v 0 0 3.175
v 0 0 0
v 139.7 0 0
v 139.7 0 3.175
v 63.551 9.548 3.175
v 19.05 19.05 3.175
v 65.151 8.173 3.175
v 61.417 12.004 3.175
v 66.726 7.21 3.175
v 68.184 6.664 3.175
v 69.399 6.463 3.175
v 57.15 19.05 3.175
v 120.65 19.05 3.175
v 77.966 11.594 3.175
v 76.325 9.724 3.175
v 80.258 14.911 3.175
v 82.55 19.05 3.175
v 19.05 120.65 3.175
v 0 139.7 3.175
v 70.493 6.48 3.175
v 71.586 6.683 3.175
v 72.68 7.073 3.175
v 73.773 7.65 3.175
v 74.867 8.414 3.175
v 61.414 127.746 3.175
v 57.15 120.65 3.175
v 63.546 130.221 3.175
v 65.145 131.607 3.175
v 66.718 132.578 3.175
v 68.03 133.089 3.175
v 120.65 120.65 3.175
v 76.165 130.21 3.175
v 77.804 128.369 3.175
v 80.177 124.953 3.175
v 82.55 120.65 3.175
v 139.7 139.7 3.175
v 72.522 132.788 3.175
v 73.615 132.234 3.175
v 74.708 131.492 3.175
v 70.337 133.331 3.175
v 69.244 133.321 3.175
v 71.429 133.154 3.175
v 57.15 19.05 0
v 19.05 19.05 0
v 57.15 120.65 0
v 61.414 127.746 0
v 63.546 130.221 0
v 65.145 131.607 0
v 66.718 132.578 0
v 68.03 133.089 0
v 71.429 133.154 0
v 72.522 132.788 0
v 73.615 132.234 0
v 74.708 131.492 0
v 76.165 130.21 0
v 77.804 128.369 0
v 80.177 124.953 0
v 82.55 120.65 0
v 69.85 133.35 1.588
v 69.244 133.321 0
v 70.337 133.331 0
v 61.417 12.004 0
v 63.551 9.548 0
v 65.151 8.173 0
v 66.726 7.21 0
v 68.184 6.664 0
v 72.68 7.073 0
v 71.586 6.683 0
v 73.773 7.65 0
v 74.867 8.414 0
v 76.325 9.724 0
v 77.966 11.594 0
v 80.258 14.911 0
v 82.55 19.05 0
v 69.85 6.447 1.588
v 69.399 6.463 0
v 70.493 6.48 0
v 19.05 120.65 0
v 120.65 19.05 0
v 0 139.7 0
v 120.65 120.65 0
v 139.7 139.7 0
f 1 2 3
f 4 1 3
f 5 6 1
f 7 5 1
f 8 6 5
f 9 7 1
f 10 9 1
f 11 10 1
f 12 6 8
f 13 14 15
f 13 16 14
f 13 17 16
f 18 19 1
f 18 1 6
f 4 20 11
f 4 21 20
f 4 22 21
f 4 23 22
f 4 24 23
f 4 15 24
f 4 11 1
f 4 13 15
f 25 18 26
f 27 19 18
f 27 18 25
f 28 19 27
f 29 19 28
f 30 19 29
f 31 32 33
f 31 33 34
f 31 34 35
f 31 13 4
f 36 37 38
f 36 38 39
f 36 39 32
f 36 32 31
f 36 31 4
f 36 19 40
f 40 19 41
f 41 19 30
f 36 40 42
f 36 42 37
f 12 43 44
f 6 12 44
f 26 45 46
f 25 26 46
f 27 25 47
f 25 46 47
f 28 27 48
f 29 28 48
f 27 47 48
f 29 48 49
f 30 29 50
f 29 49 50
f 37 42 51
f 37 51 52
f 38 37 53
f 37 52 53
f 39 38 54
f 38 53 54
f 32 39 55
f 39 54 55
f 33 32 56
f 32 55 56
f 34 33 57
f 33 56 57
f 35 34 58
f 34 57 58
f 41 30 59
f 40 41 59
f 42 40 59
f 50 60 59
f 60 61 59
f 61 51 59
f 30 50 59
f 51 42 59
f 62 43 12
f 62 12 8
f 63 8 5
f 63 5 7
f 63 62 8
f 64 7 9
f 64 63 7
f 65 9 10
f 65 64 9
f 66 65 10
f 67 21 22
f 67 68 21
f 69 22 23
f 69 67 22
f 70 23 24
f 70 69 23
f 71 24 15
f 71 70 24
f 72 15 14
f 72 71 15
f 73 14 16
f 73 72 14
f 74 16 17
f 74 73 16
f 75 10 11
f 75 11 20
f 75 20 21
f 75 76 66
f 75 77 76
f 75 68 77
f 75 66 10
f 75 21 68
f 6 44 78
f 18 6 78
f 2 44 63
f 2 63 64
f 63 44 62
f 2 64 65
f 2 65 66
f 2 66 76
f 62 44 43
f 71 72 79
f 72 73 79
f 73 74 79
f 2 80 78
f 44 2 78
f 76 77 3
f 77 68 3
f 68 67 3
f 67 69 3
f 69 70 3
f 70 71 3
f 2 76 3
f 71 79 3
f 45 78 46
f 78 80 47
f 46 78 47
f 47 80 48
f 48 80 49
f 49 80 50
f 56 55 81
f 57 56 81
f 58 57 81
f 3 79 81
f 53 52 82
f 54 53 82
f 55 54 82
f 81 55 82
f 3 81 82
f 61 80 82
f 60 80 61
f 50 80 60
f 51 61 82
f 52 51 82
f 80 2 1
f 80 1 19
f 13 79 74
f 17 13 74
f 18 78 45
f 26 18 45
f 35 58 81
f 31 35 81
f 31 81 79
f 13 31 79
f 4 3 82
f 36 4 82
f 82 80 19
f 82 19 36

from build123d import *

# Parameters (mm, degrees)
SKETCH1_W           = 139.7
SKETCH1_H           = 139.7
BOSS_EXTRUDE1_DEPTH = 3.175


with BuildPart() as part:
    # Sketch1 → Boss-Extrude1 (new body)
    with BuildSketch(Plane.XY):
        with Locations((69.85, 69.85)):
            Rectangle(SKETCH1_W, SKETCH1_H)
        with BuildLine():
            Line((19.05, 120.65), (57.15, 120.65))
            add(Edge.make_bspline(
                [(57.15, 120.65), (69.85, 146.05), (82.55, 120.65)],
                knots=[0, 0, 0, 1, 1, 1], degree=2))
            Line((82.55, 120.65), (120.65, 120.65))
            Line((120.65, 120.65), (120.65, 19.05))
            Line((120.65, 19.05), (82.55, 19.05))
            add(Edge.make_bspline(
                [(57.15, 19.05), (69.85, -6.155350719), (82.55, 19.05)],
                knots=[0, 0, 0, 1, 1, 1], degree=2))
            Line((57.15, 19.05), (19.05, 19.05))
            Line((19.05, 19.05), (19.05, 120.65))
        make_face(mode=Mode.SUBTRACT)
    extrude(amount=BOSS_EXTRUDE1_DEPTH)


solid = part.part
